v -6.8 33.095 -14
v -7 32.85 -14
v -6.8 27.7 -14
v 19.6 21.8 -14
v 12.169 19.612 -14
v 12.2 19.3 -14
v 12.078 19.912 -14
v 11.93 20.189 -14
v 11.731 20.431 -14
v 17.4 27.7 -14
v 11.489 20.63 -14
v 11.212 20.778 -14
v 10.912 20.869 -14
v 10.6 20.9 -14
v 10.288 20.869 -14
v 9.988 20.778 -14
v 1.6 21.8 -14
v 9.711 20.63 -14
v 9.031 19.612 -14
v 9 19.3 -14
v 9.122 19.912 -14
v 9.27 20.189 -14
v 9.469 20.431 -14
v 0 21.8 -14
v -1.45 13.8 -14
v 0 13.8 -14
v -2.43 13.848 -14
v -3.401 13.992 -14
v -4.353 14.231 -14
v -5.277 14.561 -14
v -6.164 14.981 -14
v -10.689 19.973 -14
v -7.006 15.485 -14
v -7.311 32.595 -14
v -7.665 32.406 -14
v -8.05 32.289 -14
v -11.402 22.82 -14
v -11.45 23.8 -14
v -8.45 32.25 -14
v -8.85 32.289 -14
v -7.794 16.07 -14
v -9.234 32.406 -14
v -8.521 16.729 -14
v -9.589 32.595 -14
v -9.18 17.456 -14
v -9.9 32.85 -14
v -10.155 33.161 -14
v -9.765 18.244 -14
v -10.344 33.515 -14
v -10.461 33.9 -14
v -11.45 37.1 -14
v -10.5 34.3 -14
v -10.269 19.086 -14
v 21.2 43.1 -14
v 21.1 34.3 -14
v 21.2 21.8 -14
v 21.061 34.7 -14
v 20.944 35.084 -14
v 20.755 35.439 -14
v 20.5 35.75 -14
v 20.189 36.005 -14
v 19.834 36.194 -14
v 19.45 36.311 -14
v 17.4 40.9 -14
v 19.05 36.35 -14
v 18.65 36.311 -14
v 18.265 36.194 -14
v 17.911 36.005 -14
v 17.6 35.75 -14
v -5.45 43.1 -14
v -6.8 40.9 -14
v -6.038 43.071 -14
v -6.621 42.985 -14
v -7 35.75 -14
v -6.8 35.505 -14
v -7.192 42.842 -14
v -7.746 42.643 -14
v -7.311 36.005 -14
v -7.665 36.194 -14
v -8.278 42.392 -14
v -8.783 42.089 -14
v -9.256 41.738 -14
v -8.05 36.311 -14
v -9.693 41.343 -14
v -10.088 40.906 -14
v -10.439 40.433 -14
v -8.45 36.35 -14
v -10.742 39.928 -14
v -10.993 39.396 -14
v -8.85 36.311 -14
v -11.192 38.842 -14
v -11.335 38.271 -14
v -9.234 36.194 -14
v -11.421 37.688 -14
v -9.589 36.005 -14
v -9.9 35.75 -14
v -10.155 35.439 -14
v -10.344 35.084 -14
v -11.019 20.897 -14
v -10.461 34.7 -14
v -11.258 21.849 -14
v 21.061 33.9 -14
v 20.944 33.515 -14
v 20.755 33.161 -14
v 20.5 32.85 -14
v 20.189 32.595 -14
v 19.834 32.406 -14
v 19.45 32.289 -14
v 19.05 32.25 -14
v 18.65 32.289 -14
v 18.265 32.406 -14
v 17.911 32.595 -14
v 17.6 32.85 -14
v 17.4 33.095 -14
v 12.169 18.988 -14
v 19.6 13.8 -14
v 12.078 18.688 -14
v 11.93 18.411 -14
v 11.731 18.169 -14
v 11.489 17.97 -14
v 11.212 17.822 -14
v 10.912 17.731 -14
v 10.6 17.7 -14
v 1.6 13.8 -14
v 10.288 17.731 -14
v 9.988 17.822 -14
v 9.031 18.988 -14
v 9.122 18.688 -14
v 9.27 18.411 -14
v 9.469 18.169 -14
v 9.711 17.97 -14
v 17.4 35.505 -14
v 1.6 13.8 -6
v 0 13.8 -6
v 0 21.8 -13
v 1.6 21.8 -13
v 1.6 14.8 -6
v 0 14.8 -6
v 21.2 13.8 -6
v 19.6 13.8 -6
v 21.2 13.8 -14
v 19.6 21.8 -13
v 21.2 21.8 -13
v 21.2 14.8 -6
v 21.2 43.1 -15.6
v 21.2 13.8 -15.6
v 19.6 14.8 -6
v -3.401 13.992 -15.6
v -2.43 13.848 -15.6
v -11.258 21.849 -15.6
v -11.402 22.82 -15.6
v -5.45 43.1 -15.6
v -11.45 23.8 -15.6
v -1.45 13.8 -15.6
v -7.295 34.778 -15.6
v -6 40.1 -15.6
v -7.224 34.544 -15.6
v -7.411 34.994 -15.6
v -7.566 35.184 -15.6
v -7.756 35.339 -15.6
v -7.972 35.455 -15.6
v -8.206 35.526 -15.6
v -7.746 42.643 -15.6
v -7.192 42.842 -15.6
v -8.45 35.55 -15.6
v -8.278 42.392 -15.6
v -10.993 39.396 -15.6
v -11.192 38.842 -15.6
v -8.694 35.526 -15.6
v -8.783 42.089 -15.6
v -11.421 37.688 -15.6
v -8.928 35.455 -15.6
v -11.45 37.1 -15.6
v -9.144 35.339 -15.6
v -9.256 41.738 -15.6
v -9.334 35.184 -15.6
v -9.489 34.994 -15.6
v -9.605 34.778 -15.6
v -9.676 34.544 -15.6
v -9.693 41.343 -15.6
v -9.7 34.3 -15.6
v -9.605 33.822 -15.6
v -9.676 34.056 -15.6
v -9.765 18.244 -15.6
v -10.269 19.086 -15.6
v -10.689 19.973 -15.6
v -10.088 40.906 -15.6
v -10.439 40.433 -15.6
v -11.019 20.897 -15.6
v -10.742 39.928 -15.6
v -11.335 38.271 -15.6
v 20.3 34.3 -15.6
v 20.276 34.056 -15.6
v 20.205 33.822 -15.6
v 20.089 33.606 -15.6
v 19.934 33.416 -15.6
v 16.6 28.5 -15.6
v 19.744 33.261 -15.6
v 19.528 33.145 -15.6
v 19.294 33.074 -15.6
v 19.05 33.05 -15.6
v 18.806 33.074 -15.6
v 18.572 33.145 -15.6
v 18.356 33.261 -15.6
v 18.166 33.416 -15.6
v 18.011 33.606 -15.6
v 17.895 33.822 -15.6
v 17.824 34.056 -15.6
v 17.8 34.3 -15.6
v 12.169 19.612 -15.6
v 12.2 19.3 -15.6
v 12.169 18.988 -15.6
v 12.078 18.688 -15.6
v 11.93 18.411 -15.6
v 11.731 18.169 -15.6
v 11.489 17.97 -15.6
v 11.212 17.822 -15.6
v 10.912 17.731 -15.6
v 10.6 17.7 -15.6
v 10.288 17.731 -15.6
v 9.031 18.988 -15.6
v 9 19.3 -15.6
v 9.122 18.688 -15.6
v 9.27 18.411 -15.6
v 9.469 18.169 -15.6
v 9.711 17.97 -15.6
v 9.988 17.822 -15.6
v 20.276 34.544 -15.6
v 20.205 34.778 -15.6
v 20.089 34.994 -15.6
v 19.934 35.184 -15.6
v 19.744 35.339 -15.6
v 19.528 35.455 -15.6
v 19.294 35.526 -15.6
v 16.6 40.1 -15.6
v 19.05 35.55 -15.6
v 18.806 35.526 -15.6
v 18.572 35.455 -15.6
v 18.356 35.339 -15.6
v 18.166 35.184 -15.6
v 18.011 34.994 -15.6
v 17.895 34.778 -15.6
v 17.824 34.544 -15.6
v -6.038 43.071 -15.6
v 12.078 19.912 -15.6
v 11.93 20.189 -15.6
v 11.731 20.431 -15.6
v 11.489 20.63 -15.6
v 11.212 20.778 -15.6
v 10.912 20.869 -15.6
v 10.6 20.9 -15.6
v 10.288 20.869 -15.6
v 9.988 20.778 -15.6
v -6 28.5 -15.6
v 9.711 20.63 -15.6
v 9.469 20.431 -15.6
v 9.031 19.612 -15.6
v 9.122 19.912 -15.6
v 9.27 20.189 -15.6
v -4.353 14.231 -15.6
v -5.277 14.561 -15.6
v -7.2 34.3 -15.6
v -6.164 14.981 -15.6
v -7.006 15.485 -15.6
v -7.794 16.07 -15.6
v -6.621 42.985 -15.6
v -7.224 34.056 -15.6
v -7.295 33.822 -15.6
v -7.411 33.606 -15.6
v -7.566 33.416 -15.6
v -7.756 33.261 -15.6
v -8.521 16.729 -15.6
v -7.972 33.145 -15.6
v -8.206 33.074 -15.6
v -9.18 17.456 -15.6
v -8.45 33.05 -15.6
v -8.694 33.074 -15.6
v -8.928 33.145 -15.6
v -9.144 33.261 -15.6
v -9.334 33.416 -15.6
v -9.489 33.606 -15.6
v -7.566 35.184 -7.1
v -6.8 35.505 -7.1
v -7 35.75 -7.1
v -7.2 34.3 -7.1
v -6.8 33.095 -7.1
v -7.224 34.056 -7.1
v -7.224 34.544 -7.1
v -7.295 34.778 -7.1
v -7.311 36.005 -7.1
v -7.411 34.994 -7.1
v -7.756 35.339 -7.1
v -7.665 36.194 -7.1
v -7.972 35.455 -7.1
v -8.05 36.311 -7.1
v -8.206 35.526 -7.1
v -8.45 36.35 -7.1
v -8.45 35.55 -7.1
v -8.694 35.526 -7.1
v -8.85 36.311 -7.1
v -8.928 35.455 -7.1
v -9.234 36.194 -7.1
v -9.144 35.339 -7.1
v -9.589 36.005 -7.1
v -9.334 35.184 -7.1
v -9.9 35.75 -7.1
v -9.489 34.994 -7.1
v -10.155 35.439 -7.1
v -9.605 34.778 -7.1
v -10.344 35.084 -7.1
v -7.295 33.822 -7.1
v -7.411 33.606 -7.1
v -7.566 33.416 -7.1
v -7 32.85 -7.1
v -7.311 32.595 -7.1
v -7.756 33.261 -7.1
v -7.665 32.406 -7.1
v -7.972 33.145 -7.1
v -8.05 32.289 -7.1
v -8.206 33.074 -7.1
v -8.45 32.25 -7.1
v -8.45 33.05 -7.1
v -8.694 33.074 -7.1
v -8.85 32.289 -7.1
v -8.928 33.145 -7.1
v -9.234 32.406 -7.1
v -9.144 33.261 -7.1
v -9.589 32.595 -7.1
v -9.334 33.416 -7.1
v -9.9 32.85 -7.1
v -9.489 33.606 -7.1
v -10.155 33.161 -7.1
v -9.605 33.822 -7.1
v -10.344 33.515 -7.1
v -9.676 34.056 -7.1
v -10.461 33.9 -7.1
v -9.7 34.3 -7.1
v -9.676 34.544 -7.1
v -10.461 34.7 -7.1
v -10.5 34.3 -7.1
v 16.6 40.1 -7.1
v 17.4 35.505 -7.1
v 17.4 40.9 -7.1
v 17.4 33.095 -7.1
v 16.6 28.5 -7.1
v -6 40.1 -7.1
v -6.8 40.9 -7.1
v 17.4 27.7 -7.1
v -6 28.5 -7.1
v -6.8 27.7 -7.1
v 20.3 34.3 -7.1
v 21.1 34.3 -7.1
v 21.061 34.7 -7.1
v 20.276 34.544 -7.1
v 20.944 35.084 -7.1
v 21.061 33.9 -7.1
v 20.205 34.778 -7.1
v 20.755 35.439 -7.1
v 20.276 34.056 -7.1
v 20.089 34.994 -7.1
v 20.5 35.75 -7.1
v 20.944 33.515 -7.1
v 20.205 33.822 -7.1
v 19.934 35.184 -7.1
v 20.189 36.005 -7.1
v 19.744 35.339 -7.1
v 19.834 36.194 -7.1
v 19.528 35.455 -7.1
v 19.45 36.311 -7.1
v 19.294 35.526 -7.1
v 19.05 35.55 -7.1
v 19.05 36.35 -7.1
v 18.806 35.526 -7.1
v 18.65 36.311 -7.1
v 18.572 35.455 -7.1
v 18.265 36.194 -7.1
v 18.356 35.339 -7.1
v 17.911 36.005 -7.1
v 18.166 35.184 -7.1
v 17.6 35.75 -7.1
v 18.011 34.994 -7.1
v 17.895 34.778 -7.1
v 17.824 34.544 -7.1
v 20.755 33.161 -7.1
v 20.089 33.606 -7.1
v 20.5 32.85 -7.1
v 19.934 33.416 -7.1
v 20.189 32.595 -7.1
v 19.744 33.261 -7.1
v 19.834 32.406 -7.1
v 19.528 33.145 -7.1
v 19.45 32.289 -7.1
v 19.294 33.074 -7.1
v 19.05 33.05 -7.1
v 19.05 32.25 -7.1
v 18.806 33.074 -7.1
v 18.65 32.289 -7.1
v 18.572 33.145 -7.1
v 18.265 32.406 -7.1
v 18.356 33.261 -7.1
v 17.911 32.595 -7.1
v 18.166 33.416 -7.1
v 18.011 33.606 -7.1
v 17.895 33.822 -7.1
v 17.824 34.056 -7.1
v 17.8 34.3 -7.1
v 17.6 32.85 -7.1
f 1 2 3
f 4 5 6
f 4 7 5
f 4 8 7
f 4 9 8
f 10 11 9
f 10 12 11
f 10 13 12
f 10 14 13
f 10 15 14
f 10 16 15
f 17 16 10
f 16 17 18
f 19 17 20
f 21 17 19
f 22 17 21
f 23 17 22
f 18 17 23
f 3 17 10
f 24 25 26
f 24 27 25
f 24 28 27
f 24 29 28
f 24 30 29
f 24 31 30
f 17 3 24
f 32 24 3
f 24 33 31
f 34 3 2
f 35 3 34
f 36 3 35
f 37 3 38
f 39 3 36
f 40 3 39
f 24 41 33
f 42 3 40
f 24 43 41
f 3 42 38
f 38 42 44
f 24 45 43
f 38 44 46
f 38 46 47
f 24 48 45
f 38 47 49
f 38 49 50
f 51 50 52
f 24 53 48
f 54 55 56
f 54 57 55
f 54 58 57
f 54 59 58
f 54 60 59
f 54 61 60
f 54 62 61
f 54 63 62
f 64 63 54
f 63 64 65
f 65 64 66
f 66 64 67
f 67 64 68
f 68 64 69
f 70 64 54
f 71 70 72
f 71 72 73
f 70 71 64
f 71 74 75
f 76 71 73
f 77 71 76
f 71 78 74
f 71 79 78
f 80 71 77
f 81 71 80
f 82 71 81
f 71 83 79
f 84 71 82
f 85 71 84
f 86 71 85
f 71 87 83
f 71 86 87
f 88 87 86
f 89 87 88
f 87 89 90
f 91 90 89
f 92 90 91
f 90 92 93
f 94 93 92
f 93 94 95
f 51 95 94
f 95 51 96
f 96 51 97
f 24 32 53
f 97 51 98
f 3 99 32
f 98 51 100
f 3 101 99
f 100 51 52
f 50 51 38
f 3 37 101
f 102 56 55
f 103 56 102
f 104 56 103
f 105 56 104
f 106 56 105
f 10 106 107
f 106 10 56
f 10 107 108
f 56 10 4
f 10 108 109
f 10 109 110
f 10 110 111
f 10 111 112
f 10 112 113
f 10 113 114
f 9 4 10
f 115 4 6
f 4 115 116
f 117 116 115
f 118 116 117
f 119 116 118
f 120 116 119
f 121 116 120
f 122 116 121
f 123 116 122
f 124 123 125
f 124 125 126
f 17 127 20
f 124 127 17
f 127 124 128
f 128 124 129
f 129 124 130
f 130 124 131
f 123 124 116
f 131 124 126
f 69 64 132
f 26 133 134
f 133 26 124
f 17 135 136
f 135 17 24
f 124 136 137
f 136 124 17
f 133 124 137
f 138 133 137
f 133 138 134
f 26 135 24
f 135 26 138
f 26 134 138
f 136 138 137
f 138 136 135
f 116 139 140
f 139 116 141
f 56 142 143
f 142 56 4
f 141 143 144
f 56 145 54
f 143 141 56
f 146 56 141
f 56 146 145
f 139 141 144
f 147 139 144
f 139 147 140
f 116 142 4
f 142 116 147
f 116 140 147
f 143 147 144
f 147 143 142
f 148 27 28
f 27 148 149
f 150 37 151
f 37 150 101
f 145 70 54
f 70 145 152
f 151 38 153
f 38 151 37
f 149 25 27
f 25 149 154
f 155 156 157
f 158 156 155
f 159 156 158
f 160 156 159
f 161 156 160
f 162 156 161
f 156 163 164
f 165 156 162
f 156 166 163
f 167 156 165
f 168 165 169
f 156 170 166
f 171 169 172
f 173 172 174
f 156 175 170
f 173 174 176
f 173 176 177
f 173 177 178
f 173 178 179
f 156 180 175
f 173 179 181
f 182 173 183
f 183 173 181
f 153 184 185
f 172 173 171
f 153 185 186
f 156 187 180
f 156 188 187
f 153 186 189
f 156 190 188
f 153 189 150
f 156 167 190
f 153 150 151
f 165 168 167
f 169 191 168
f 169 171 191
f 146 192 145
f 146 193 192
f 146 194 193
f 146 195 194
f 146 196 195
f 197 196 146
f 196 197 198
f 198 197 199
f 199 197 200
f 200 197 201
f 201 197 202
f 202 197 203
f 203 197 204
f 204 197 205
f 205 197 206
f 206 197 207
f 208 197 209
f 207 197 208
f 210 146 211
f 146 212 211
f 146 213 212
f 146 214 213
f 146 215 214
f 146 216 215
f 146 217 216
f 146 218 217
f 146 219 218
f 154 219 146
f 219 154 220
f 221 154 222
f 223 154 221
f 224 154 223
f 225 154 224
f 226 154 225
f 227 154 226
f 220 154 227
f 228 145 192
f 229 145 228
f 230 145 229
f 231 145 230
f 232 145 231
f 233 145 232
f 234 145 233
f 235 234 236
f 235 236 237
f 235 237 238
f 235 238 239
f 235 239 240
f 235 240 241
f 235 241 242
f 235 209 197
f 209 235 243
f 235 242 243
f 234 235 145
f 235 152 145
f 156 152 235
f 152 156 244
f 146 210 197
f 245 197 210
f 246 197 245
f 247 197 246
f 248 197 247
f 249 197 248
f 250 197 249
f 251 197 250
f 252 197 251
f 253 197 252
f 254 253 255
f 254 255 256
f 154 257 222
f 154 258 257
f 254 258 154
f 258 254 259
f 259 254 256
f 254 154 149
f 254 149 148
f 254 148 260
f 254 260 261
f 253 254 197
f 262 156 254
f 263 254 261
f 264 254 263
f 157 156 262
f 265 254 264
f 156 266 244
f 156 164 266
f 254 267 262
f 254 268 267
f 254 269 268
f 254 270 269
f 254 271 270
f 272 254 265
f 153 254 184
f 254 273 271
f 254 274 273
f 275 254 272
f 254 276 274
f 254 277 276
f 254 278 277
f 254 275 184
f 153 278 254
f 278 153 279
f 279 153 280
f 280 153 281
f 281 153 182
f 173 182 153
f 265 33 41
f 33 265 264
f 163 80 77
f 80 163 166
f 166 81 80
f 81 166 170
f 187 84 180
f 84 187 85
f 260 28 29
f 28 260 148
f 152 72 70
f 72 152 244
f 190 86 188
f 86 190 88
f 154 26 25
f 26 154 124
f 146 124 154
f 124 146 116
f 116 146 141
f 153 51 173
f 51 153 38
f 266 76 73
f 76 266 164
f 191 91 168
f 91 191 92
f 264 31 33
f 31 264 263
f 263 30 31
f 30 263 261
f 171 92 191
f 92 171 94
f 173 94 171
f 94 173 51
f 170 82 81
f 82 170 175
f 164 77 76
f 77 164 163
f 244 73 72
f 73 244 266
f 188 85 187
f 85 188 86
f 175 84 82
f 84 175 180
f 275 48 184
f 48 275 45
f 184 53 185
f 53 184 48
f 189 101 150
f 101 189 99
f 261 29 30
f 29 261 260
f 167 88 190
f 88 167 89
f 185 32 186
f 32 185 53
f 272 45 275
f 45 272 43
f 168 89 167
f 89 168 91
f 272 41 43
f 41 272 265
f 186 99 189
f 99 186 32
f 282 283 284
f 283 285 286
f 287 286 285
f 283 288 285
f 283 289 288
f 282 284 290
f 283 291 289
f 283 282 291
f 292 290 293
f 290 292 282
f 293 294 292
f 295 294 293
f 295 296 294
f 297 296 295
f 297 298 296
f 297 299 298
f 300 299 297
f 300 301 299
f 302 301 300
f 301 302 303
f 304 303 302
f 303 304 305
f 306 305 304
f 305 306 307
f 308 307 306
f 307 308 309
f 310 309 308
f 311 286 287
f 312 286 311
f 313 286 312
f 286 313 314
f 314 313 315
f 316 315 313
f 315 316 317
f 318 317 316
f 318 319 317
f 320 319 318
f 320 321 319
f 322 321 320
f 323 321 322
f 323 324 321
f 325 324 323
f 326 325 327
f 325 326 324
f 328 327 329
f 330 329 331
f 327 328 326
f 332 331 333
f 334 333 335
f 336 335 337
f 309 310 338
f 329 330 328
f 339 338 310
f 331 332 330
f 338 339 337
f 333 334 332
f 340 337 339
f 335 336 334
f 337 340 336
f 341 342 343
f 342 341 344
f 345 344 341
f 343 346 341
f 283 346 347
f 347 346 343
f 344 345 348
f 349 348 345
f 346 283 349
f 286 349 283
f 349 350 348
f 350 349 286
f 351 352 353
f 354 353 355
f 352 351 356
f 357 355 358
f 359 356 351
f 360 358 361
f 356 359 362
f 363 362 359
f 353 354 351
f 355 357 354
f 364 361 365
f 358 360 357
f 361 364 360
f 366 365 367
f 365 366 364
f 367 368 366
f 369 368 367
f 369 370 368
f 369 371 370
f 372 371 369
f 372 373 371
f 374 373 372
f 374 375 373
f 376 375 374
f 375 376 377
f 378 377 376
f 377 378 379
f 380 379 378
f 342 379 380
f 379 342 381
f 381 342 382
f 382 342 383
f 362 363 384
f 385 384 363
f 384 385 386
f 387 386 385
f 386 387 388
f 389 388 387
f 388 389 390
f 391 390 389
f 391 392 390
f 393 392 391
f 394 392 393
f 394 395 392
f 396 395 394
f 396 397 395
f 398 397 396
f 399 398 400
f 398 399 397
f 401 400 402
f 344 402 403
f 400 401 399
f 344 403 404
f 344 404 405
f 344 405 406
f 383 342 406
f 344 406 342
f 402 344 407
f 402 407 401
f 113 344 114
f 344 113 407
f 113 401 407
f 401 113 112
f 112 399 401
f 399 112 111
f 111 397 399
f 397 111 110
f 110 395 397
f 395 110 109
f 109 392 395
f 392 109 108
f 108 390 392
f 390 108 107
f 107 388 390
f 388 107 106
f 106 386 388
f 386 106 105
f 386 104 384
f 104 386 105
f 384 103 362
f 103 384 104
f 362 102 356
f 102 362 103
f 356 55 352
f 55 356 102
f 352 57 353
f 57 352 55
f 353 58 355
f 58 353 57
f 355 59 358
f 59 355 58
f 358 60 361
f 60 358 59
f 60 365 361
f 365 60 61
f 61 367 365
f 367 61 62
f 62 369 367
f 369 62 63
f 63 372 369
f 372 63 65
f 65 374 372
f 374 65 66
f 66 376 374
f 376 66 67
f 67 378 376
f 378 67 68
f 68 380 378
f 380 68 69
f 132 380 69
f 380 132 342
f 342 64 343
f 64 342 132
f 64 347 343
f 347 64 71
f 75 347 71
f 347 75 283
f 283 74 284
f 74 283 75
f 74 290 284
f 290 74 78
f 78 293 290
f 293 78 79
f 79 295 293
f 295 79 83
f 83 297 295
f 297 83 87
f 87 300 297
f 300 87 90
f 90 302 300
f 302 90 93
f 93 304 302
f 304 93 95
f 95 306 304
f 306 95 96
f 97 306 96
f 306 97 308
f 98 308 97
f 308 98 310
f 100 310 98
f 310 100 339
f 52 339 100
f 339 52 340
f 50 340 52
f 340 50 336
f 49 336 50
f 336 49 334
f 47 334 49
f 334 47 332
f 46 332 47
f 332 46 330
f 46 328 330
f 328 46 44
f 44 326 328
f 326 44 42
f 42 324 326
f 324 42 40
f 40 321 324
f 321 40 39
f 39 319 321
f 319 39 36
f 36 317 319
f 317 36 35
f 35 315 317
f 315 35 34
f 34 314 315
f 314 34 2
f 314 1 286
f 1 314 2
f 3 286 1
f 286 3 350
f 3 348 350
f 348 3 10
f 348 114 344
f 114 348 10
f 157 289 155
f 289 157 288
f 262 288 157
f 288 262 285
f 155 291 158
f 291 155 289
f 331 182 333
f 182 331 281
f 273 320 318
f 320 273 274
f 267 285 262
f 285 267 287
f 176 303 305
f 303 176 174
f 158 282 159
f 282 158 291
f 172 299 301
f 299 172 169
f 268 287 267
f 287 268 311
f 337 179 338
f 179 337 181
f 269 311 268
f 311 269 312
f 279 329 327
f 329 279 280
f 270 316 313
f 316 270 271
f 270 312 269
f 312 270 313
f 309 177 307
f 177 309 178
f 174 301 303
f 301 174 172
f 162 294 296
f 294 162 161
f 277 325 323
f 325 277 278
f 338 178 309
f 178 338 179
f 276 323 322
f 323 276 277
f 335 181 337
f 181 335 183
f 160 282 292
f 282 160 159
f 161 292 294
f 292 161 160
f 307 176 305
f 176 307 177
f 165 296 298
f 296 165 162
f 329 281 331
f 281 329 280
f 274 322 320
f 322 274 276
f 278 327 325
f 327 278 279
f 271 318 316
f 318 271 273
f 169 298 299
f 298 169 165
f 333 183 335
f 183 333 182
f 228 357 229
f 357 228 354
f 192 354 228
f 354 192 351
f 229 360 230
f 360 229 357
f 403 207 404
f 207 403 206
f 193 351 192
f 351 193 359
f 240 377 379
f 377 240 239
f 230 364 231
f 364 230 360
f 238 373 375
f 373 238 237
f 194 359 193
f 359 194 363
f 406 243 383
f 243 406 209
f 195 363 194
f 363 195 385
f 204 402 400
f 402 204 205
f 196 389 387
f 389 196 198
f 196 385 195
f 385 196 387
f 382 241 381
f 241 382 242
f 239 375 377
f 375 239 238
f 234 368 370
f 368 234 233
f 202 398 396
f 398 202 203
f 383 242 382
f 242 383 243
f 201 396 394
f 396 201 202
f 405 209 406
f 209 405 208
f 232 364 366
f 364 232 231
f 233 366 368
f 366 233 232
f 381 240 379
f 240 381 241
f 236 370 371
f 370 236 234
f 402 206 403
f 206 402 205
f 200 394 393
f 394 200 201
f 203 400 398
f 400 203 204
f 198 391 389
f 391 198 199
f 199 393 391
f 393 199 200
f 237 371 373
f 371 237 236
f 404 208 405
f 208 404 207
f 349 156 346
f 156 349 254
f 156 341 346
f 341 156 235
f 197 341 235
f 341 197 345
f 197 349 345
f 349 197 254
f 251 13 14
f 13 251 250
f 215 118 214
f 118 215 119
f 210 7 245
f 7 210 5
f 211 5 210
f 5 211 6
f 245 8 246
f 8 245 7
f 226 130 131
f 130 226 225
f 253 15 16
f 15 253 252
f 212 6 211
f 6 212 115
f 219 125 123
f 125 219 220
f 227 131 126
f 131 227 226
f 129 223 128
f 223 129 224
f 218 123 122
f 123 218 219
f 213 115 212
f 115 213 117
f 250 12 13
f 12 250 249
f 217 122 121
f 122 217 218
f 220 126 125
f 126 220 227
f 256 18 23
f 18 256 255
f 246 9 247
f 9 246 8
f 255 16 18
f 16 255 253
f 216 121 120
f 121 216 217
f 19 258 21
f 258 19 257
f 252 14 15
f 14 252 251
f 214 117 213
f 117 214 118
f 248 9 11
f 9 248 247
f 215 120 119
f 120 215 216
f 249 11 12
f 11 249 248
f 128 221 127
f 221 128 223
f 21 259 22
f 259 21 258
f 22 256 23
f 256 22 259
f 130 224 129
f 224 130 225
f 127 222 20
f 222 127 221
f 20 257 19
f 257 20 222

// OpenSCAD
// file: ../lib/shapes.scad
// lib/shapes.scad — geometry helpers shared by every part. `use` it: it defines no variables.
// $fn is dynamically scoped, so round things here take the caller's $fn: set `$fn = fn_round;`
// at the top of a part file (after the include) and pass `$fn = fn_small` on small features.

// 2D rectangle `size` = [w, h] with its four corners cut at 45° by c.
// Corner at the origin unless center=true.
module chamfered_rect(size, c, center=false) {
    translate(center ? [-size.x/2, -size.y/2] : [0, 0])
        polygon([[c, 0], [size.x - c, 0], [size.x, c], [size.x, size.y - c],
                 [size.x - c, size.y], [c, size.y], [0, size.y - c], [0, c]]);
}

// 2D rectangle `size` = [w, h] with its four corners rounded by r.
// Corner at the origin unless center=true.
module rounded_rect(size, r, center=false) {
    translate(center ? [0, 0] : [size.x/2, size.y/2])
        offset(r=r) square([size.x - 2*r, size.y - 2*r], center=true);
}

// Box `size` = [x, y, z] with all twelve edges chamfered at 45° by c: the hull of three boxes,
// each shrunk by c along two of its axes, is exactly that.
// Corner at the origin unless center=true.
module chamfered_box(size, c, center=false) {
    translate(center ? -size/2 : [0, 0, 0]) hull() {
        translate([c, c, 0]) cube([size.x - 2*c, size.y - 2*c, size.z]);
        translate([c, 0, c]) cube([size.x - 2*c, size.y, size.z - 2*c]);
        translate([0, c, c]) cube([size.x, size.y - 2*c, size.z - 2*c]);
    }
}

// Hexagonal prism (nut, nut trap): across-flats af, height h along +Z from z=0
// (center=true: centred on z=0). Corners on ±X, flats at y = ±af/2.
module hex(af, h, center=false) {
    cylinder(d=af/cos(30), h=h, center=center, $fn=6);
}

// Torus about Z: centreline radius R, tube radius r, tube centre in the plane z=0.
// The ring takes the caller's $fn; fn_tube (default: the same) sets the tube's.
module torus(R, r, fn_tube) {
    rotate_extrude() translate([R, 0]) circle(r=r, $fn=is_undef(fn_tube) ? $fn : fn_tube);
}

// 2D right triangle: right angle at the origin, leg a along +X, leg b along +Y (b defaults
// to a: a 45° chamfer or gusset). Mirror/rotate it into place, then linear_extrude.
module right_triangle(a, b) {
    polygon([[0, 0], [a, 0], [0, is_undef(b) ? a : b]]);
}

// Section helpers for renders: keep only the part of the children whose coordinate along
// axis ("x" | "y" | "z") is below (keep_below) or above (keep_above) `at`.
// `big` must exceed the model's extent in every direction.
module keep_below(axis, at, big=1000) {
    difference() { children(); translate(_axis_vec(axis)*(at + big)) cube(2*big, center=true); }
}
module keep_above(axis, at, big=1000) {
    difference() { children(); translate(_axis_vec(axis)*(at - big)) cube(2*big, center=true); }
}
function _axis_vec(axis) = axis == "x" ? [1, 0, 0] : axis == "y" ? [0, 1, 0] : [0, 0, 1];
// main file
// parts/servo_holder.scad — the front plate that carries the SG90 and the front rod bearing
// [v2 Body007: sketches back_plate, supports, servo_spacer].
//
// A plate `wall` thick perpendicular to Z at z∈[z_cap0, z_plate1], its front face flush with
// the end cap's front face, standing on the end cap top (y = top_y). The outline is derived
// from the servo window: `servo_margin` past the left tab hole and above the window, the
// right edge flush with the body at x = W, two rounds on the left corners. On the body (+Z)
// side: a `servo_frame_w` guide frame around the window and ø`servo_boss_d` bosses on the tab
// holes, both `servo_screw_engage − wall` tall (plate + boss = M2 engagement), and two ribs
// on the end cap's side walls with a 45° gusset on the free top corner (v2 Chamfer007: the rib
// keeps its full height for rib_depth − gusset, then falls to rib_h − gusset at the free end).
// The SG90 mounts from the front: tabs on the −Z face, body through the window toward +Z,
// shaft toward −Z into the gears at z∈[gear_z0, gear_z1].

include <../params.scad>
use <../lib/shapes.scad>
$fn = fn_round;
eps = 0.01;

// ---- outline in the plate plane (x, y) ---------------------------------------------------
svh_x0 = tab_x[0] - servo_margin;                  // left edge: margin past the left tab hole [v2 −11.45]
svh_x1 = W;                                        // right edge flush with the body's side
svh_y0 = top_y;                                    // stands on the end cap top
svh_y1 = servo_y + servo_win.y/2 + servo_margin;   // margin above the window [v2 43.5]
svh_boss_h = servo_screw_engage - wall;            // frame and boss height: plate + boss = screw engagement [v2 6.9]
svh_depth = wall + max(rib_depth, svh_boss_h);     // total extent along Z from the front face
svh_win = [win_cx - servo_win.x/2, win_cx + servo_win.x/2, servo_y - servo_win.y/2, servo_y + servo_win.y/2];   // window x0, x1, y0, y1
svh_r = max(holder_r_top, holder_r_bot);           // the outline's rectangle starts past the larger round

// 2D plate outline: the hull of the two left rounds and the rectangle to the right of them.
// Both rounds touch x = svh_x0, so the hull's left edge is the straight line between them.
module servo_holder_outline() {
    hull() {
        translate([svh_x0 + holder_r_top, svh_y1 - holder_r_top]) circle(r=holder_r_top);
        translate([svh_x0 + holder_r_bot, svh_y0 + holder_r_bot]) circle(r=holder_r_bot);
        translate([svh_x0 + svh_r, svh_y0]) square([svh_x1 - svh_x0 - svh_r, svh_y1 - svh_y0]);
    }
}

// One rib on the plate's body side, x∈[0, wall]: full height rib_h for rib_depth − gusset,
// then a 45° gusset down to rib_h − gusset at the free end. Profile drawn in (y, z), extruded
// along +X (rotate([90,0,90]) maps 2D (u, v) and the extrusion w onto (w, u, v)).
module servo_holder_rib() {
    rotate([90, 0, 90]) linear_extrude(wall)
        polygon([[svh_y0, z_plate1], [svh_y0 + rib_h, z_plate1],
                 [svh_y0 + rib_h, z_plate1 + rib_depth - gusset],
                 [svh_y0 + rib_h - gusset, z_plate1 + rib_depth],
                 [svh_y0, z_plate1 + rib_depth]]);
}

// The asserts live inside the module, not at file top level: `use <servo_holder.scad>` (assembly.scad)
// imports modules, functions and variables but does not execute top-level statements, so a
// file-top assert would be silent in the assembly and only fire on a standalone render.
module servo_holder() {
    assert(holder_r_top + holder_r_bot <= svh_y1 - svh_y0 + num_tol, "servo_holder: the two left rounds overlap: lower holder_r_top/holder_r_bot");
    assert(max(holder_r_top, holder_r_bot) <= svh_x1 - svh_x0 + num_tol, "servo_holder: a left round is wider than the plate");
    assert(tab_x[1] + servo_boss_d/2 <= svh_x1 + num_tol, "servo_holder: the right tab boss sticks out past the plate edge x = W");
    assert(svh_win[1] + servo_frame_w <= svh_x1 + num_tol, "servo_holder: the window frame sticks out past the plate edge x = W");
    assert(screw_y + screw_hole_d/2 < svh_win[2] - servo_frame_w - num_tol, "servo_holder: rod hole runs into the window frame: gear_cd too small");
    assert(top_y + rib_h <= svh_win[2] - servo_frame_w + num_tol, "servo_holder: ribs reach the window frame");
    assert(gusset <= min(rib_h, rib_depth) + num_tol, "servo_holder: gusset larger than the rib");
    assert(servo_boss_d > servo_tab_hole_d + num_tol, "servo_holder: tab boss no wider than its hole");
    difference() {
        union() {
            translate([0, 0, z_cap0]) linear_extrude(wall) servo_holder_outline();
            // guide frame and tab bosses on the body side (v2 servo_spacer: one padded sketch).
            // convexity is a preview hint only: a ring is not convex, so without it OpenCSG
            // previews show gaps in its far wall (the export is unaffected).
            translate([0, 0, z_plate1]) linear_extrude(svh_boss_h, convexity=4) {
                translate([win_cx, servo_y]) square(servo_win + 2*servo_frame_w*[1, 1], center=true);
                for (x = tab_x) translate([x, servo_y]) circle(d=servo_boss_d, $fn=fn_small);
            }
            for (x = [0, W - wall]) translate([x, 0, 0]) servo_holder_rib();
        }
        // window for the servo body, through plate and frame
        translate([win_cx, servo_y, z_cap0 - eps]) linear_extrude(svh_depth + 2*eps) square(servo_win, center=true);
        // M2 tab screws through plate and bosses
        for (x = tab_x) translate([x, servo_y, z_cap0 - eps]) cylinder(d=servo_tab_hole_d, h=svh_depth + 2*eps, $fn=fn_small);
        // lead screw
        translate([W/2, screw_y, z_cap0 - eps]) cylinder(d=screw_hole_d, h=svh_depth + 2*eps, $fn=fn_small);
    }
}

// Print: plate front face (z = z_cap0) on the bed; frame, bosses and ribs extrude up, the
// gusset is a 45° overhang.
module servo_holder_print() { translate([0, 0, -z_cap0]) servo_holder(); }

function servo_holder_size() = [svh_x1 - svh_x0, svh_y1 - svh_y0, svh_depth];

for_print = false;
if (is_undef(ASSEMBLY)) {
    echo(servo_holder_size=servo_holder_size(), svh_x0=svh_x0, svh_y1=svh_y1, svh_win=svh_win, svh_boss_h=svh_boss_h);
    if (for_print) servo_holder_print(); else servo_holder();
}
